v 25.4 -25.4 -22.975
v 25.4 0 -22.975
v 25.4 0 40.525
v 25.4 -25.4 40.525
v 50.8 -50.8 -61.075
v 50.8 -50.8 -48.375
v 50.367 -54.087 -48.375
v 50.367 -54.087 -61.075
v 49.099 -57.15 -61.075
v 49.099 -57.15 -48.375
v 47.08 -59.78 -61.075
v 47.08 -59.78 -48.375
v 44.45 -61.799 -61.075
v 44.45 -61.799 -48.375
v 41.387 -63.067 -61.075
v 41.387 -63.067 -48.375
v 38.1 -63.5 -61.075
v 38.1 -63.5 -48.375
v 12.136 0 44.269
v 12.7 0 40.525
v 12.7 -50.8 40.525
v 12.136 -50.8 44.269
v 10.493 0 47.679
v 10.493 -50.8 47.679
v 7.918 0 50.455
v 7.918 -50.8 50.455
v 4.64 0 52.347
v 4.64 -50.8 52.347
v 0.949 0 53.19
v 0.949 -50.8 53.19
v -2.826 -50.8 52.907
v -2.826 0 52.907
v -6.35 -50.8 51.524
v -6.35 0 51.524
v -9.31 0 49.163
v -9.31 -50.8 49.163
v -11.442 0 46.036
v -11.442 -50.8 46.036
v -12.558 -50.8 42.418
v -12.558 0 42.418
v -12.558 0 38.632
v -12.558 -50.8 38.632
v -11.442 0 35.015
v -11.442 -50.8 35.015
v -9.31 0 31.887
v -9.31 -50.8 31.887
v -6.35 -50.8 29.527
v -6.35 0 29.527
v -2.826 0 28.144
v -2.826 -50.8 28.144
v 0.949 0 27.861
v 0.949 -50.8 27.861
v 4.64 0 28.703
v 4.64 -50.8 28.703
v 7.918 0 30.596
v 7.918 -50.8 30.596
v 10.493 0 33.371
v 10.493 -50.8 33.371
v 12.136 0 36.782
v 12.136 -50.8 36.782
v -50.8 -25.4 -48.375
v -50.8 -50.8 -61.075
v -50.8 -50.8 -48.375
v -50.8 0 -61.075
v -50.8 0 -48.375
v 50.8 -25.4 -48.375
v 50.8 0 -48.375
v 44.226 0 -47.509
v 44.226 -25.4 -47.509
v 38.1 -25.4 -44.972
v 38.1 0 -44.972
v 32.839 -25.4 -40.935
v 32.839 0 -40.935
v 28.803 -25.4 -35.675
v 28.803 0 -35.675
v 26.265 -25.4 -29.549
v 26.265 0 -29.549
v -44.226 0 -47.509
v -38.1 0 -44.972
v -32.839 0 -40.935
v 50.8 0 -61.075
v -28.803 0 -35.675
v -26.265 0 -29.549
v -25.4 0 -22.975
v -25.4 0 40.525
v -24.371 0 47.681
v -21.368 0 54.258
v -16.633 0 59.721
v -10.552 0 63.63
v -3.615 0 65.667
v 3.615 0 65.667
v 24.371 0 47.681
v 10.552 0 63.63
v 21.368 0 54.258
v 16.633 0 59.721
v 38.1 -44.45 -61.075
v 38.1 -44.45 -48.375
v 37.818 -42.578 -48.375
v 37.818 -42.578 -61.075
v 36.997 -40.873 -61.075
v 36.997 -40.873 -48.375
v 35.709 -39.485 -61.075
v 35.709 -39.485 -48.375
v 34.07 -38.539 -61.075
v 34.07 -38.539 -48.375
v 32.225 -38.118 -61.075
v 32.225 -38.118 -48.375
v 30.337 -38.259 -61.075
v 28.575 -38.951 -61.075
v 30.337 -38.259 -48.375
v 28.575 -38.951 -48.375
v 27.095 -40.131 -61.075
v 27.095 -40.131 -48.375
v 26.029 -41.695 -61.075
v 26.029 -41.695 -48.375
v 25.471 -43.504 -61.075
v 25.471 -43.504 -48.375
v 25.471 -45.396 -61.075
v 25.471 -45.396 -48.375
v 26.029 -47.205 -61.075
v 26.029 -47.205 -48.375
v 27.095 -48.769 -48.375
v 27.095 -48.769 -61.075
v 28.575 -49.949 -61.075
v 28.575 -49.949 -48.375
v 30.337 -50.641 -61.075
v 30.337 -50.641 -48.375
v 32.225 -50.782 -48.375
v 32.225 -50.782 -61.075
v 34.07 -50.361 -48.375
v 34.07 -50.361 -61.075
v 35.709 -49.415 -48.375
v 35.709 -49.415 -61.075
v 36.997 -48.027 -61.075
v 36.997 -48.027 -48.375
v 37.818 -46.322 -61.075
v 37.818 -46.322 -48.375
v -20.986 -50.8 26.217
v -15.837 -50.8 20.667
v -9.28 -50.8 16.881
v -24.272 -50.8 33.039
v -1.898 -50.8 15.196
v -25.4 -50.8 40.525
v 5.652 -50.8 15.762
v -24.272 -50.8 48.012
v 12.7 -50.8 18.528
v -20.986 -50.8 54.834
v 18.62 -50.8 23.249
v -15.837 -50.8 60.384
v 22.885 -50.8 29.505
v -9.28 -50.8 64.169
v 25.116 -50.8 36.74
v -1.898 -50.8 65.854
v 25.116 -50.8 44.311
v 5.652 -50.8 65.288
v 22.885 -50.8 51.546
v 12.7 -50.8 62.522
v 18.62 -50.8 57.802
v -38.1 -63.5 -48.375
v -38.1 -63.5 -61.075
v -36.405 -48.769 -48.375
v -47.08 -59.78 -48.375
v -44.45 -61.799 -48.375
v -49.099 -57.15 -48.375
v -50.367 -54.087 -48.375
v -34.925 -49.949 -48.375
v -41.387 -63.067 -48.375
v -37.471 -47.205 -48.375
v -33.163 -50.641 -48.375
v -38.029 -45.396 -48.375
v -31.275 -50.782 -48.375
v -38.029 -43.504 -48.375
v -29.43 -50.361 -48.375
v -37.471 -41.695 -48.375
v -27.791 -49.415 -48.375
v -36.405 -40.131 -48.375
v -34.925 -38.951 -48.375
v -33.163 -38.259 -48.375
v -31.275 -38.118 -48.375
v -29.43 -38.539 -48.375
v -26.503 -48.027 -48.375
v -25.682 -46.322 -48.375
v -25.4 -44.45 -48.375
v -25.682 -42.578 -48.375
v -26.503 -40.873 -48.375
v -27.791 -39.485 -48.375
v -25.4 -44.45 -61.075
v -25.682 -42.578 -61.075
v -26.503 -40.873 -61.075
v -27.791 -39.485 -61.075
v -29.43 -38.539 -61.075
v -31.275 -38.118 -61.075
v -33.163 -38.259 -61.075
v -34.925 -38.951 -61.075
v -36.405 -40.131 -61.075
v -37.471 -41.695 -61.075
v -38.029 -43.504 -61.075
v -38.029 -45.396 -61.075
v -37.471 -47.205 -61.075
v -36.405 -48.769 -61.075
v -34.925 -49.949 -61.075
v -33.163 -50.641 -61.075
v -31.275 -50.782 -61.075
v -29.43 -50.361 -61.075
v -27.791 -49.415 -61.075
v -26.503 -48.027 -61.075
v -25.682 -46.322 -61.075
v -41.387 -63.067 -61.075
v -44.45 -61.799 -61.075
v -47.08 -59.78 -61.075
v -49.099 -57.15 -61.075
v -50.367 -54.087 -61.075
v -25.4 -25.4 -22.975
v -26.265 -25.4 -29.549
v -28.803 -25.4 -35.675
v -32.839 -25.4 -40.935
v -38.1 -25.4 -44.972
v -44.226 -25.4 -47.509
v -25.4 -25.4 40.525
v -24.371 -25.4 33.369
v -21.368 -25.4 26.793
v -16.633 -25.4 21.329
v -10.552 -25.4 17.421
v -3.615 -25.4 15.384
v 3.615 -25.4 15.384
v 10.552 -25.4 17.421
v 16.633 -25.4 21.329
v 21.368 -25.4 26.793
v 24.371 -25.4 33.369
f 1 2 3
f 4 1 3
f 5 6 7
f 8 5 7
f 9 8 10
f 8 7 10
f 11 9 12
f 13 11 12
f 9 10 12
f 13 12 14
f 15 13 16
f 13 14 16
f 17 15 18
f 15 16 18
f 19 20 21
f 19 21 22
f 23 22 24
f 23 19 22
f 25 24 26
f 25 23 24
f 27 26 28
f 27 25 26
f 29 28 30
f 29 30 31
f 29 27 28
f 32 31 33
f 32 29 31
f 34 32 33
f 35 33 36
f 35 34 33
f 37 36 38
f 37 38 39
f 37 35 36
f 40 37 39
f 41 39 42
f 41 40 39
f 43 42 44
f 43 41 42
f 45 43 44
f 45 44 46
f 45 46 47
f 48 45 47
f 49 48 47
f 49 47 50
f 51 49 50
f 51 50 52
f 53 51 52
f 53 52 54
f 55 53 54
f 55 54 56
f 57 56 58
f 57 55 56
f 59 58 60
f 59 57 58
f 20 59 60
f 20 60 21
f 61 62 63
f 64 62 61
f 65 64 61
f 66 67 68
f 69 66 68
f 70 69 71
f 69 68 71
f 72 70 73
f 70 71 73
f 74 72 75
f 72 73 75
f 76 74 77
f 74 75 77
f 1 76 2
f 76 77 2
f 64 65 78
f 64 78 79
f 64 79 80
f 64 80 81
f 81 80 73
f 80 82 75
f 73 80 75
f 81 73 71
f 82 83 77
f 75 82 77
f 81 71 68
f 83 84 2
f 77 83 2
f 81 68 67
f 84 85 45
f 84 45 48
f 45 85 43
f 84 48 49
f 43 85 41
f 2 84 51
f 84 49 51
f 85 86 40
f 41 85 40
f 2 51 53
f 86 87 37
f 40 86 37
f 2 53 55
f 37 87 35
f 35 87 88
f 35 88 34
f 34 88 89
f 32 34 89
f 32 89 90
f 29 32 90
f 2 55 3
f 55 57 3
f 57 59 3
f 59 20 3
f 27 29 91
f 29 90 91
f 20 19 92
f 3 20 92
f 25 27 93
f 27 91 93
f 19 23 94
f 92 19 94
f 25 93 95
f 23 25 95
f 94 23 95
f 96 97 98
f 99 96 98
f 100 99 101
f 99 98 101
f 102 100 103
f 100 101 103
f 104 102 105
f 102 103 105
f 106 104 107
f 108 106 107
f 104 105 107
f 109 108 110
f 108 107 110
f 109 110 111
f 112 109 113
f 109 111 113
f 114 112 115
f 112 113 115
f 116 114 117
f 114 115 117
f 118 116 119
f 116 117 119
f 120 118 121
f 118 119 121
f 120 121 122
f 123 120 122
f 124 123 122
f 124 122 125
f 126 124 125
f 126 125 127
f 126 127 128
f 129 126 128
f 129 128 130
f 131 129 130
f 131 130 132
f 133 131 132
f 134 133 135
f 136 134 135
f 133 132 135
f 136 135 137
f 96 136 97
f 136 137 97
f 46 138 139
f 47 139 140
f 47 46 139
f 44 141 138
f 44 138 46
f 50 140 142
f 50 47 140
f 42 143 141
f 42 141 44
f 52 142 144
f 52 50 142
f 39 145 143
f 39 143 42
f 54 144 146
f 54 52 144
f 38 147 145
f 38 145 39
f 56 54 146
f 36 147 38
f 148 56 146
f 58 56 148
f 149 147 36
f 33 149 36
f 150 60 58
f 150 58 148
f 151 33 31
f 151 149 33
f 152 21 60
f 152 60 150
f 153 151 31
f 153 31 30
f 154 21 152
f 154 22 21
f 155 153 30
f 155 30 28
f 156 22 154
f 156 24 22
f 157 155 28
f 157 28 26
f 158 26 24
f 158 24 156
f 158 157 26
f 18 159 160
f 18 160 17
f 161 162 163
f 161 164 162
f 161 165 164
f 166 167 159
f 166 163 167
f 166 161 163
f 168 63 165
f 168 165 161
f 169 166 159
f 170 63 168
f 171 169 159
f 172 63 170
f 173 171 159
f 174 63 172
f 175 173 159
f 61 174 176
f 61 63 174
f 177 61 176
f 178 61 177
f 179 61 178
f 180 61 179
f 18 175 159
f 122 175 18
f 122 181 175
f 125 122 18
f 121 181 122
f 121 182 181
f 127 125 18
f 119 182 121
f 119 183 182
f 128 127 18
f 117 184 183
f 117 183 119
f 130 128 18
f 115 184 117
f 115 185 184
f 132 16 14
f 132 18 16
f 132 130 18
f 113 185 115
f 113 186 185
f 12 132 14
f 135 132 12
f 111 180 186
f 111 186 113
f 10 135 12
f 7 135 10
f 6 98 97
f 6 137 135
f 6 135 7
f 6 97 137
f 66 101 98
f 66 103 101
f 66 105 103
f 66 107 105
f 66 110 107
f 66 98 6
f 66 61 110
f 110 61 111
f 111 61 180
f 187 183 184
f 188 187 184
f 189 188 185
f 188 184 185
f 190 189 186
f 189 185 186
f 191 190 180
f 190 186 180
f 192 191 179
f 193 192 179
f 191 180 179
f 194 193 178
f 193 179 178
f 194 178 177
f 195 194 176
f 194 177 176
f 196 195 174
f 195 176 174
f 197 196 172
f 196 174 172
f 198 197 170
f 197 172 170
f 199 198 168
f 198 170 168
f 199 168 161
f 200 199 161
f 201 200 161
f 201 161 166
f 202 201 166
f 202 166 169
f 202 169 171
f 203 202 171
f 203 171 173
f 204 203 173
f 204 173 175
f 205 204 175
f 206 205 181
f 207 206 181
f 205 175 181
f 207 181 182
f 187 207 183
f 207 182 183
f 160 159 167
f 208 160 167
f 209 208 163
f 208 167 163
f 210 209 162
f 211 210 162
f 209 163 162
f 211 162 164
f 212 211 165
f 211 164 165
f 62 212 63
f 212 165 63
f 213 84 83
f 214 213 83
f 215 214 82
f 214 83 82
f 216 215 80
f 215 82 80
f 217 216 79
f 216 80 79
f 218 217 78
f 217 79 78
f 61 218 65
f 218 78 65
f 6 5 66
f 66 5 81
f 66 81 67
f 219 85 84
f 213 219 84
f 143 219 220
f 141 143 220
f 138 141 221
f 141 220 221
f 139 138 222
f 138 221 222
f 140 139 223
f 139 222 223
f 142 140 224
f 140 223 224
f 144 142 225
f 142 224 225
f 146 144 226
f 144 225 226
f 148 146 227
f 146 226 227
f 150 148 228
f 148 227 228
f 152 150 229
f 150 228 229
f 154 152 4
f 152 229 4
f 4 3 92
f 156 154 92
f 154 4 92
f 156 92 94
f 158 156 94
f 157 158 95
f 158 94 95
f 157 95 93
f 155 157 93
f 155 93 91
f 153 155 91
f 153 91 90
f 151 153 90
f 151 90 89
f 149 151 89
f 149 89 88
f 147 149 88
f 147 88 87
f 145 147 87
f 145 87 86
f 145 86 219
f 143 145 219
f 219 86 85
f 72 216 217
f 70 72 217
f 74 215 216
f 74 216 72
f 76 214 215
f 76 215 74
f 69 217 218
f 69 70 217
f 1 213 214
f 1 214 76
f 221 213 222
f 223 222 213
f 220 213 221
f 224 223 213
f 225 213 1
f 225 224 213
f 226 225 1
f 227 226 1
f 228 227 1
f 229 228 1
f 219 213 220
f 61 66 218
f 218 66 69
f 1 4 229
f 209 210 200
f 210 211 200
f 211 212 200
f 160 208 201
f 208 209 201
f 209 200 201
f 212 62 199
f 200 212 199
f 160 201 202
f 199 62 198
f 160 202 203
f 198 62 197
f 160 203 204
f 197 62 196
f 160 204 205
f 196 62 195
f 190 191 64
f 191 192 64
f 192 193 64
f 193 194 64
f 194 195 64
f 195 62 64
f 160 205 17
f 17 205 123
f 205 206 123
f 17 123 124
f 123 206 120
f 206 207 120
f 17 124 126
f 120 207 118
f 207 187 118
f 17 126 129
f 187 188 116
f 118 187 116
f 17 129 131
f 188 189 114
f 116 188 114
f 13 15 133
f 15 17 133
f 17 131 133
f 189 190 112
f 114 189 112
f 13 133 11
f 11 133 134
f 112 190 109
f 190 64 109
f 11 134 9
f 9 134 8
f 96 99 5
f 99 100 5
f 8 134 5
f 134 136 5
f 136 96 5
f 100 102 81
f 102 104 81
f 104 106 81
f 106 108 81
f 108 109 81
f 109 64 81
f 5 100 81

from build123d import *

# Parameters (mm, degrees)
F1_DEPTH = 25.4
F0_R     = 12.7
F2_DEPTH = 50.8
F0_W     = 101.6
F0_H     = 12.7
F3_DEPTH = 63.5
F4_R     = 6.35
F5_DEPTH = 12.7


with BuildPart() as f1:
    # F0 (on Front) → F1 (new body)
    with BuildSketch(Plane.XZ):
        with BuildLine():
            ThreePointArc((25.4, 40.525289), (0, 15.125289), (-25.4, 40.525289))
            Line((-25.4, 40.525289), (-25.4, -22.974711))
            ThreePointArc((-25.4, -22.974711), (-32.839488, -40.935223), (-50.8, -48.374711))
            Line((-50.8, -48.374711), (50.8, -48.374711))
            ThreePointArc((50.8, -48.374711), (32.839488, -40.935223), (25.4, -22.974711))
            Line((25.4, -22.974711), (25.4, 40.525289))
        make_face()
    extrude(amount=F1_DEPTH)

    # F0 (on Front) → F2 (join)
    with BuildSketch(Plane.XZ):
        with BuildLine():
            ThreePointArc((25.4, 40.525289), (0, 65.925289), (-25.4, 40.525289))
            ThreePointArc((-25.4, 40.525289), (0, 15.125289), (25.4, 40.525289))
        make_face()
        with Locations((0, 40.525289)):
            Circle(F0_R, mode=Mode.SUBTRACT)
    extrude(amount=F2_DEPTH)

    # F0 (on Front) → F3 (join)
    with BuildSketch(Plane.XZ):
        with Locations((0, -54.724711)):
            Rectangle(F0_W, F0_H)
    extrude(amount=F3_DEPTH)

    # F4 (on face) → F5 (cut)
    with BuildSketch(Plane.XY.offset(-48.374711)):
        with Locations((-31.75, -44.45)):
            Circle(F4_R)
        with BuildLine():
            Line((-50.8, -63.5), (-38.1, -63.5))
            ThreePointArc((-38.1, -63.5), (-47.080256, -59.780256), (-50.8, -50.8))
            Line((-50.8, -50.8), (-50.8, -63.5))
        make_face()
        with BuildLine():
            ThreePointArc((50.8, -50.8), (47.080256, -59.780256), (38.1, -63.5))
            Line((38.1, -63.5), (50.8, -63.5))
            Line((50.8, -63.5), (50.8, -50.8))
        make_face()
        with Locations((31.75, -44.45)):
            Circle(F4_R)
    extrude(amount=-F5_DEPTH, mode=Mode.SUBTRACT)


solid = f1.part
